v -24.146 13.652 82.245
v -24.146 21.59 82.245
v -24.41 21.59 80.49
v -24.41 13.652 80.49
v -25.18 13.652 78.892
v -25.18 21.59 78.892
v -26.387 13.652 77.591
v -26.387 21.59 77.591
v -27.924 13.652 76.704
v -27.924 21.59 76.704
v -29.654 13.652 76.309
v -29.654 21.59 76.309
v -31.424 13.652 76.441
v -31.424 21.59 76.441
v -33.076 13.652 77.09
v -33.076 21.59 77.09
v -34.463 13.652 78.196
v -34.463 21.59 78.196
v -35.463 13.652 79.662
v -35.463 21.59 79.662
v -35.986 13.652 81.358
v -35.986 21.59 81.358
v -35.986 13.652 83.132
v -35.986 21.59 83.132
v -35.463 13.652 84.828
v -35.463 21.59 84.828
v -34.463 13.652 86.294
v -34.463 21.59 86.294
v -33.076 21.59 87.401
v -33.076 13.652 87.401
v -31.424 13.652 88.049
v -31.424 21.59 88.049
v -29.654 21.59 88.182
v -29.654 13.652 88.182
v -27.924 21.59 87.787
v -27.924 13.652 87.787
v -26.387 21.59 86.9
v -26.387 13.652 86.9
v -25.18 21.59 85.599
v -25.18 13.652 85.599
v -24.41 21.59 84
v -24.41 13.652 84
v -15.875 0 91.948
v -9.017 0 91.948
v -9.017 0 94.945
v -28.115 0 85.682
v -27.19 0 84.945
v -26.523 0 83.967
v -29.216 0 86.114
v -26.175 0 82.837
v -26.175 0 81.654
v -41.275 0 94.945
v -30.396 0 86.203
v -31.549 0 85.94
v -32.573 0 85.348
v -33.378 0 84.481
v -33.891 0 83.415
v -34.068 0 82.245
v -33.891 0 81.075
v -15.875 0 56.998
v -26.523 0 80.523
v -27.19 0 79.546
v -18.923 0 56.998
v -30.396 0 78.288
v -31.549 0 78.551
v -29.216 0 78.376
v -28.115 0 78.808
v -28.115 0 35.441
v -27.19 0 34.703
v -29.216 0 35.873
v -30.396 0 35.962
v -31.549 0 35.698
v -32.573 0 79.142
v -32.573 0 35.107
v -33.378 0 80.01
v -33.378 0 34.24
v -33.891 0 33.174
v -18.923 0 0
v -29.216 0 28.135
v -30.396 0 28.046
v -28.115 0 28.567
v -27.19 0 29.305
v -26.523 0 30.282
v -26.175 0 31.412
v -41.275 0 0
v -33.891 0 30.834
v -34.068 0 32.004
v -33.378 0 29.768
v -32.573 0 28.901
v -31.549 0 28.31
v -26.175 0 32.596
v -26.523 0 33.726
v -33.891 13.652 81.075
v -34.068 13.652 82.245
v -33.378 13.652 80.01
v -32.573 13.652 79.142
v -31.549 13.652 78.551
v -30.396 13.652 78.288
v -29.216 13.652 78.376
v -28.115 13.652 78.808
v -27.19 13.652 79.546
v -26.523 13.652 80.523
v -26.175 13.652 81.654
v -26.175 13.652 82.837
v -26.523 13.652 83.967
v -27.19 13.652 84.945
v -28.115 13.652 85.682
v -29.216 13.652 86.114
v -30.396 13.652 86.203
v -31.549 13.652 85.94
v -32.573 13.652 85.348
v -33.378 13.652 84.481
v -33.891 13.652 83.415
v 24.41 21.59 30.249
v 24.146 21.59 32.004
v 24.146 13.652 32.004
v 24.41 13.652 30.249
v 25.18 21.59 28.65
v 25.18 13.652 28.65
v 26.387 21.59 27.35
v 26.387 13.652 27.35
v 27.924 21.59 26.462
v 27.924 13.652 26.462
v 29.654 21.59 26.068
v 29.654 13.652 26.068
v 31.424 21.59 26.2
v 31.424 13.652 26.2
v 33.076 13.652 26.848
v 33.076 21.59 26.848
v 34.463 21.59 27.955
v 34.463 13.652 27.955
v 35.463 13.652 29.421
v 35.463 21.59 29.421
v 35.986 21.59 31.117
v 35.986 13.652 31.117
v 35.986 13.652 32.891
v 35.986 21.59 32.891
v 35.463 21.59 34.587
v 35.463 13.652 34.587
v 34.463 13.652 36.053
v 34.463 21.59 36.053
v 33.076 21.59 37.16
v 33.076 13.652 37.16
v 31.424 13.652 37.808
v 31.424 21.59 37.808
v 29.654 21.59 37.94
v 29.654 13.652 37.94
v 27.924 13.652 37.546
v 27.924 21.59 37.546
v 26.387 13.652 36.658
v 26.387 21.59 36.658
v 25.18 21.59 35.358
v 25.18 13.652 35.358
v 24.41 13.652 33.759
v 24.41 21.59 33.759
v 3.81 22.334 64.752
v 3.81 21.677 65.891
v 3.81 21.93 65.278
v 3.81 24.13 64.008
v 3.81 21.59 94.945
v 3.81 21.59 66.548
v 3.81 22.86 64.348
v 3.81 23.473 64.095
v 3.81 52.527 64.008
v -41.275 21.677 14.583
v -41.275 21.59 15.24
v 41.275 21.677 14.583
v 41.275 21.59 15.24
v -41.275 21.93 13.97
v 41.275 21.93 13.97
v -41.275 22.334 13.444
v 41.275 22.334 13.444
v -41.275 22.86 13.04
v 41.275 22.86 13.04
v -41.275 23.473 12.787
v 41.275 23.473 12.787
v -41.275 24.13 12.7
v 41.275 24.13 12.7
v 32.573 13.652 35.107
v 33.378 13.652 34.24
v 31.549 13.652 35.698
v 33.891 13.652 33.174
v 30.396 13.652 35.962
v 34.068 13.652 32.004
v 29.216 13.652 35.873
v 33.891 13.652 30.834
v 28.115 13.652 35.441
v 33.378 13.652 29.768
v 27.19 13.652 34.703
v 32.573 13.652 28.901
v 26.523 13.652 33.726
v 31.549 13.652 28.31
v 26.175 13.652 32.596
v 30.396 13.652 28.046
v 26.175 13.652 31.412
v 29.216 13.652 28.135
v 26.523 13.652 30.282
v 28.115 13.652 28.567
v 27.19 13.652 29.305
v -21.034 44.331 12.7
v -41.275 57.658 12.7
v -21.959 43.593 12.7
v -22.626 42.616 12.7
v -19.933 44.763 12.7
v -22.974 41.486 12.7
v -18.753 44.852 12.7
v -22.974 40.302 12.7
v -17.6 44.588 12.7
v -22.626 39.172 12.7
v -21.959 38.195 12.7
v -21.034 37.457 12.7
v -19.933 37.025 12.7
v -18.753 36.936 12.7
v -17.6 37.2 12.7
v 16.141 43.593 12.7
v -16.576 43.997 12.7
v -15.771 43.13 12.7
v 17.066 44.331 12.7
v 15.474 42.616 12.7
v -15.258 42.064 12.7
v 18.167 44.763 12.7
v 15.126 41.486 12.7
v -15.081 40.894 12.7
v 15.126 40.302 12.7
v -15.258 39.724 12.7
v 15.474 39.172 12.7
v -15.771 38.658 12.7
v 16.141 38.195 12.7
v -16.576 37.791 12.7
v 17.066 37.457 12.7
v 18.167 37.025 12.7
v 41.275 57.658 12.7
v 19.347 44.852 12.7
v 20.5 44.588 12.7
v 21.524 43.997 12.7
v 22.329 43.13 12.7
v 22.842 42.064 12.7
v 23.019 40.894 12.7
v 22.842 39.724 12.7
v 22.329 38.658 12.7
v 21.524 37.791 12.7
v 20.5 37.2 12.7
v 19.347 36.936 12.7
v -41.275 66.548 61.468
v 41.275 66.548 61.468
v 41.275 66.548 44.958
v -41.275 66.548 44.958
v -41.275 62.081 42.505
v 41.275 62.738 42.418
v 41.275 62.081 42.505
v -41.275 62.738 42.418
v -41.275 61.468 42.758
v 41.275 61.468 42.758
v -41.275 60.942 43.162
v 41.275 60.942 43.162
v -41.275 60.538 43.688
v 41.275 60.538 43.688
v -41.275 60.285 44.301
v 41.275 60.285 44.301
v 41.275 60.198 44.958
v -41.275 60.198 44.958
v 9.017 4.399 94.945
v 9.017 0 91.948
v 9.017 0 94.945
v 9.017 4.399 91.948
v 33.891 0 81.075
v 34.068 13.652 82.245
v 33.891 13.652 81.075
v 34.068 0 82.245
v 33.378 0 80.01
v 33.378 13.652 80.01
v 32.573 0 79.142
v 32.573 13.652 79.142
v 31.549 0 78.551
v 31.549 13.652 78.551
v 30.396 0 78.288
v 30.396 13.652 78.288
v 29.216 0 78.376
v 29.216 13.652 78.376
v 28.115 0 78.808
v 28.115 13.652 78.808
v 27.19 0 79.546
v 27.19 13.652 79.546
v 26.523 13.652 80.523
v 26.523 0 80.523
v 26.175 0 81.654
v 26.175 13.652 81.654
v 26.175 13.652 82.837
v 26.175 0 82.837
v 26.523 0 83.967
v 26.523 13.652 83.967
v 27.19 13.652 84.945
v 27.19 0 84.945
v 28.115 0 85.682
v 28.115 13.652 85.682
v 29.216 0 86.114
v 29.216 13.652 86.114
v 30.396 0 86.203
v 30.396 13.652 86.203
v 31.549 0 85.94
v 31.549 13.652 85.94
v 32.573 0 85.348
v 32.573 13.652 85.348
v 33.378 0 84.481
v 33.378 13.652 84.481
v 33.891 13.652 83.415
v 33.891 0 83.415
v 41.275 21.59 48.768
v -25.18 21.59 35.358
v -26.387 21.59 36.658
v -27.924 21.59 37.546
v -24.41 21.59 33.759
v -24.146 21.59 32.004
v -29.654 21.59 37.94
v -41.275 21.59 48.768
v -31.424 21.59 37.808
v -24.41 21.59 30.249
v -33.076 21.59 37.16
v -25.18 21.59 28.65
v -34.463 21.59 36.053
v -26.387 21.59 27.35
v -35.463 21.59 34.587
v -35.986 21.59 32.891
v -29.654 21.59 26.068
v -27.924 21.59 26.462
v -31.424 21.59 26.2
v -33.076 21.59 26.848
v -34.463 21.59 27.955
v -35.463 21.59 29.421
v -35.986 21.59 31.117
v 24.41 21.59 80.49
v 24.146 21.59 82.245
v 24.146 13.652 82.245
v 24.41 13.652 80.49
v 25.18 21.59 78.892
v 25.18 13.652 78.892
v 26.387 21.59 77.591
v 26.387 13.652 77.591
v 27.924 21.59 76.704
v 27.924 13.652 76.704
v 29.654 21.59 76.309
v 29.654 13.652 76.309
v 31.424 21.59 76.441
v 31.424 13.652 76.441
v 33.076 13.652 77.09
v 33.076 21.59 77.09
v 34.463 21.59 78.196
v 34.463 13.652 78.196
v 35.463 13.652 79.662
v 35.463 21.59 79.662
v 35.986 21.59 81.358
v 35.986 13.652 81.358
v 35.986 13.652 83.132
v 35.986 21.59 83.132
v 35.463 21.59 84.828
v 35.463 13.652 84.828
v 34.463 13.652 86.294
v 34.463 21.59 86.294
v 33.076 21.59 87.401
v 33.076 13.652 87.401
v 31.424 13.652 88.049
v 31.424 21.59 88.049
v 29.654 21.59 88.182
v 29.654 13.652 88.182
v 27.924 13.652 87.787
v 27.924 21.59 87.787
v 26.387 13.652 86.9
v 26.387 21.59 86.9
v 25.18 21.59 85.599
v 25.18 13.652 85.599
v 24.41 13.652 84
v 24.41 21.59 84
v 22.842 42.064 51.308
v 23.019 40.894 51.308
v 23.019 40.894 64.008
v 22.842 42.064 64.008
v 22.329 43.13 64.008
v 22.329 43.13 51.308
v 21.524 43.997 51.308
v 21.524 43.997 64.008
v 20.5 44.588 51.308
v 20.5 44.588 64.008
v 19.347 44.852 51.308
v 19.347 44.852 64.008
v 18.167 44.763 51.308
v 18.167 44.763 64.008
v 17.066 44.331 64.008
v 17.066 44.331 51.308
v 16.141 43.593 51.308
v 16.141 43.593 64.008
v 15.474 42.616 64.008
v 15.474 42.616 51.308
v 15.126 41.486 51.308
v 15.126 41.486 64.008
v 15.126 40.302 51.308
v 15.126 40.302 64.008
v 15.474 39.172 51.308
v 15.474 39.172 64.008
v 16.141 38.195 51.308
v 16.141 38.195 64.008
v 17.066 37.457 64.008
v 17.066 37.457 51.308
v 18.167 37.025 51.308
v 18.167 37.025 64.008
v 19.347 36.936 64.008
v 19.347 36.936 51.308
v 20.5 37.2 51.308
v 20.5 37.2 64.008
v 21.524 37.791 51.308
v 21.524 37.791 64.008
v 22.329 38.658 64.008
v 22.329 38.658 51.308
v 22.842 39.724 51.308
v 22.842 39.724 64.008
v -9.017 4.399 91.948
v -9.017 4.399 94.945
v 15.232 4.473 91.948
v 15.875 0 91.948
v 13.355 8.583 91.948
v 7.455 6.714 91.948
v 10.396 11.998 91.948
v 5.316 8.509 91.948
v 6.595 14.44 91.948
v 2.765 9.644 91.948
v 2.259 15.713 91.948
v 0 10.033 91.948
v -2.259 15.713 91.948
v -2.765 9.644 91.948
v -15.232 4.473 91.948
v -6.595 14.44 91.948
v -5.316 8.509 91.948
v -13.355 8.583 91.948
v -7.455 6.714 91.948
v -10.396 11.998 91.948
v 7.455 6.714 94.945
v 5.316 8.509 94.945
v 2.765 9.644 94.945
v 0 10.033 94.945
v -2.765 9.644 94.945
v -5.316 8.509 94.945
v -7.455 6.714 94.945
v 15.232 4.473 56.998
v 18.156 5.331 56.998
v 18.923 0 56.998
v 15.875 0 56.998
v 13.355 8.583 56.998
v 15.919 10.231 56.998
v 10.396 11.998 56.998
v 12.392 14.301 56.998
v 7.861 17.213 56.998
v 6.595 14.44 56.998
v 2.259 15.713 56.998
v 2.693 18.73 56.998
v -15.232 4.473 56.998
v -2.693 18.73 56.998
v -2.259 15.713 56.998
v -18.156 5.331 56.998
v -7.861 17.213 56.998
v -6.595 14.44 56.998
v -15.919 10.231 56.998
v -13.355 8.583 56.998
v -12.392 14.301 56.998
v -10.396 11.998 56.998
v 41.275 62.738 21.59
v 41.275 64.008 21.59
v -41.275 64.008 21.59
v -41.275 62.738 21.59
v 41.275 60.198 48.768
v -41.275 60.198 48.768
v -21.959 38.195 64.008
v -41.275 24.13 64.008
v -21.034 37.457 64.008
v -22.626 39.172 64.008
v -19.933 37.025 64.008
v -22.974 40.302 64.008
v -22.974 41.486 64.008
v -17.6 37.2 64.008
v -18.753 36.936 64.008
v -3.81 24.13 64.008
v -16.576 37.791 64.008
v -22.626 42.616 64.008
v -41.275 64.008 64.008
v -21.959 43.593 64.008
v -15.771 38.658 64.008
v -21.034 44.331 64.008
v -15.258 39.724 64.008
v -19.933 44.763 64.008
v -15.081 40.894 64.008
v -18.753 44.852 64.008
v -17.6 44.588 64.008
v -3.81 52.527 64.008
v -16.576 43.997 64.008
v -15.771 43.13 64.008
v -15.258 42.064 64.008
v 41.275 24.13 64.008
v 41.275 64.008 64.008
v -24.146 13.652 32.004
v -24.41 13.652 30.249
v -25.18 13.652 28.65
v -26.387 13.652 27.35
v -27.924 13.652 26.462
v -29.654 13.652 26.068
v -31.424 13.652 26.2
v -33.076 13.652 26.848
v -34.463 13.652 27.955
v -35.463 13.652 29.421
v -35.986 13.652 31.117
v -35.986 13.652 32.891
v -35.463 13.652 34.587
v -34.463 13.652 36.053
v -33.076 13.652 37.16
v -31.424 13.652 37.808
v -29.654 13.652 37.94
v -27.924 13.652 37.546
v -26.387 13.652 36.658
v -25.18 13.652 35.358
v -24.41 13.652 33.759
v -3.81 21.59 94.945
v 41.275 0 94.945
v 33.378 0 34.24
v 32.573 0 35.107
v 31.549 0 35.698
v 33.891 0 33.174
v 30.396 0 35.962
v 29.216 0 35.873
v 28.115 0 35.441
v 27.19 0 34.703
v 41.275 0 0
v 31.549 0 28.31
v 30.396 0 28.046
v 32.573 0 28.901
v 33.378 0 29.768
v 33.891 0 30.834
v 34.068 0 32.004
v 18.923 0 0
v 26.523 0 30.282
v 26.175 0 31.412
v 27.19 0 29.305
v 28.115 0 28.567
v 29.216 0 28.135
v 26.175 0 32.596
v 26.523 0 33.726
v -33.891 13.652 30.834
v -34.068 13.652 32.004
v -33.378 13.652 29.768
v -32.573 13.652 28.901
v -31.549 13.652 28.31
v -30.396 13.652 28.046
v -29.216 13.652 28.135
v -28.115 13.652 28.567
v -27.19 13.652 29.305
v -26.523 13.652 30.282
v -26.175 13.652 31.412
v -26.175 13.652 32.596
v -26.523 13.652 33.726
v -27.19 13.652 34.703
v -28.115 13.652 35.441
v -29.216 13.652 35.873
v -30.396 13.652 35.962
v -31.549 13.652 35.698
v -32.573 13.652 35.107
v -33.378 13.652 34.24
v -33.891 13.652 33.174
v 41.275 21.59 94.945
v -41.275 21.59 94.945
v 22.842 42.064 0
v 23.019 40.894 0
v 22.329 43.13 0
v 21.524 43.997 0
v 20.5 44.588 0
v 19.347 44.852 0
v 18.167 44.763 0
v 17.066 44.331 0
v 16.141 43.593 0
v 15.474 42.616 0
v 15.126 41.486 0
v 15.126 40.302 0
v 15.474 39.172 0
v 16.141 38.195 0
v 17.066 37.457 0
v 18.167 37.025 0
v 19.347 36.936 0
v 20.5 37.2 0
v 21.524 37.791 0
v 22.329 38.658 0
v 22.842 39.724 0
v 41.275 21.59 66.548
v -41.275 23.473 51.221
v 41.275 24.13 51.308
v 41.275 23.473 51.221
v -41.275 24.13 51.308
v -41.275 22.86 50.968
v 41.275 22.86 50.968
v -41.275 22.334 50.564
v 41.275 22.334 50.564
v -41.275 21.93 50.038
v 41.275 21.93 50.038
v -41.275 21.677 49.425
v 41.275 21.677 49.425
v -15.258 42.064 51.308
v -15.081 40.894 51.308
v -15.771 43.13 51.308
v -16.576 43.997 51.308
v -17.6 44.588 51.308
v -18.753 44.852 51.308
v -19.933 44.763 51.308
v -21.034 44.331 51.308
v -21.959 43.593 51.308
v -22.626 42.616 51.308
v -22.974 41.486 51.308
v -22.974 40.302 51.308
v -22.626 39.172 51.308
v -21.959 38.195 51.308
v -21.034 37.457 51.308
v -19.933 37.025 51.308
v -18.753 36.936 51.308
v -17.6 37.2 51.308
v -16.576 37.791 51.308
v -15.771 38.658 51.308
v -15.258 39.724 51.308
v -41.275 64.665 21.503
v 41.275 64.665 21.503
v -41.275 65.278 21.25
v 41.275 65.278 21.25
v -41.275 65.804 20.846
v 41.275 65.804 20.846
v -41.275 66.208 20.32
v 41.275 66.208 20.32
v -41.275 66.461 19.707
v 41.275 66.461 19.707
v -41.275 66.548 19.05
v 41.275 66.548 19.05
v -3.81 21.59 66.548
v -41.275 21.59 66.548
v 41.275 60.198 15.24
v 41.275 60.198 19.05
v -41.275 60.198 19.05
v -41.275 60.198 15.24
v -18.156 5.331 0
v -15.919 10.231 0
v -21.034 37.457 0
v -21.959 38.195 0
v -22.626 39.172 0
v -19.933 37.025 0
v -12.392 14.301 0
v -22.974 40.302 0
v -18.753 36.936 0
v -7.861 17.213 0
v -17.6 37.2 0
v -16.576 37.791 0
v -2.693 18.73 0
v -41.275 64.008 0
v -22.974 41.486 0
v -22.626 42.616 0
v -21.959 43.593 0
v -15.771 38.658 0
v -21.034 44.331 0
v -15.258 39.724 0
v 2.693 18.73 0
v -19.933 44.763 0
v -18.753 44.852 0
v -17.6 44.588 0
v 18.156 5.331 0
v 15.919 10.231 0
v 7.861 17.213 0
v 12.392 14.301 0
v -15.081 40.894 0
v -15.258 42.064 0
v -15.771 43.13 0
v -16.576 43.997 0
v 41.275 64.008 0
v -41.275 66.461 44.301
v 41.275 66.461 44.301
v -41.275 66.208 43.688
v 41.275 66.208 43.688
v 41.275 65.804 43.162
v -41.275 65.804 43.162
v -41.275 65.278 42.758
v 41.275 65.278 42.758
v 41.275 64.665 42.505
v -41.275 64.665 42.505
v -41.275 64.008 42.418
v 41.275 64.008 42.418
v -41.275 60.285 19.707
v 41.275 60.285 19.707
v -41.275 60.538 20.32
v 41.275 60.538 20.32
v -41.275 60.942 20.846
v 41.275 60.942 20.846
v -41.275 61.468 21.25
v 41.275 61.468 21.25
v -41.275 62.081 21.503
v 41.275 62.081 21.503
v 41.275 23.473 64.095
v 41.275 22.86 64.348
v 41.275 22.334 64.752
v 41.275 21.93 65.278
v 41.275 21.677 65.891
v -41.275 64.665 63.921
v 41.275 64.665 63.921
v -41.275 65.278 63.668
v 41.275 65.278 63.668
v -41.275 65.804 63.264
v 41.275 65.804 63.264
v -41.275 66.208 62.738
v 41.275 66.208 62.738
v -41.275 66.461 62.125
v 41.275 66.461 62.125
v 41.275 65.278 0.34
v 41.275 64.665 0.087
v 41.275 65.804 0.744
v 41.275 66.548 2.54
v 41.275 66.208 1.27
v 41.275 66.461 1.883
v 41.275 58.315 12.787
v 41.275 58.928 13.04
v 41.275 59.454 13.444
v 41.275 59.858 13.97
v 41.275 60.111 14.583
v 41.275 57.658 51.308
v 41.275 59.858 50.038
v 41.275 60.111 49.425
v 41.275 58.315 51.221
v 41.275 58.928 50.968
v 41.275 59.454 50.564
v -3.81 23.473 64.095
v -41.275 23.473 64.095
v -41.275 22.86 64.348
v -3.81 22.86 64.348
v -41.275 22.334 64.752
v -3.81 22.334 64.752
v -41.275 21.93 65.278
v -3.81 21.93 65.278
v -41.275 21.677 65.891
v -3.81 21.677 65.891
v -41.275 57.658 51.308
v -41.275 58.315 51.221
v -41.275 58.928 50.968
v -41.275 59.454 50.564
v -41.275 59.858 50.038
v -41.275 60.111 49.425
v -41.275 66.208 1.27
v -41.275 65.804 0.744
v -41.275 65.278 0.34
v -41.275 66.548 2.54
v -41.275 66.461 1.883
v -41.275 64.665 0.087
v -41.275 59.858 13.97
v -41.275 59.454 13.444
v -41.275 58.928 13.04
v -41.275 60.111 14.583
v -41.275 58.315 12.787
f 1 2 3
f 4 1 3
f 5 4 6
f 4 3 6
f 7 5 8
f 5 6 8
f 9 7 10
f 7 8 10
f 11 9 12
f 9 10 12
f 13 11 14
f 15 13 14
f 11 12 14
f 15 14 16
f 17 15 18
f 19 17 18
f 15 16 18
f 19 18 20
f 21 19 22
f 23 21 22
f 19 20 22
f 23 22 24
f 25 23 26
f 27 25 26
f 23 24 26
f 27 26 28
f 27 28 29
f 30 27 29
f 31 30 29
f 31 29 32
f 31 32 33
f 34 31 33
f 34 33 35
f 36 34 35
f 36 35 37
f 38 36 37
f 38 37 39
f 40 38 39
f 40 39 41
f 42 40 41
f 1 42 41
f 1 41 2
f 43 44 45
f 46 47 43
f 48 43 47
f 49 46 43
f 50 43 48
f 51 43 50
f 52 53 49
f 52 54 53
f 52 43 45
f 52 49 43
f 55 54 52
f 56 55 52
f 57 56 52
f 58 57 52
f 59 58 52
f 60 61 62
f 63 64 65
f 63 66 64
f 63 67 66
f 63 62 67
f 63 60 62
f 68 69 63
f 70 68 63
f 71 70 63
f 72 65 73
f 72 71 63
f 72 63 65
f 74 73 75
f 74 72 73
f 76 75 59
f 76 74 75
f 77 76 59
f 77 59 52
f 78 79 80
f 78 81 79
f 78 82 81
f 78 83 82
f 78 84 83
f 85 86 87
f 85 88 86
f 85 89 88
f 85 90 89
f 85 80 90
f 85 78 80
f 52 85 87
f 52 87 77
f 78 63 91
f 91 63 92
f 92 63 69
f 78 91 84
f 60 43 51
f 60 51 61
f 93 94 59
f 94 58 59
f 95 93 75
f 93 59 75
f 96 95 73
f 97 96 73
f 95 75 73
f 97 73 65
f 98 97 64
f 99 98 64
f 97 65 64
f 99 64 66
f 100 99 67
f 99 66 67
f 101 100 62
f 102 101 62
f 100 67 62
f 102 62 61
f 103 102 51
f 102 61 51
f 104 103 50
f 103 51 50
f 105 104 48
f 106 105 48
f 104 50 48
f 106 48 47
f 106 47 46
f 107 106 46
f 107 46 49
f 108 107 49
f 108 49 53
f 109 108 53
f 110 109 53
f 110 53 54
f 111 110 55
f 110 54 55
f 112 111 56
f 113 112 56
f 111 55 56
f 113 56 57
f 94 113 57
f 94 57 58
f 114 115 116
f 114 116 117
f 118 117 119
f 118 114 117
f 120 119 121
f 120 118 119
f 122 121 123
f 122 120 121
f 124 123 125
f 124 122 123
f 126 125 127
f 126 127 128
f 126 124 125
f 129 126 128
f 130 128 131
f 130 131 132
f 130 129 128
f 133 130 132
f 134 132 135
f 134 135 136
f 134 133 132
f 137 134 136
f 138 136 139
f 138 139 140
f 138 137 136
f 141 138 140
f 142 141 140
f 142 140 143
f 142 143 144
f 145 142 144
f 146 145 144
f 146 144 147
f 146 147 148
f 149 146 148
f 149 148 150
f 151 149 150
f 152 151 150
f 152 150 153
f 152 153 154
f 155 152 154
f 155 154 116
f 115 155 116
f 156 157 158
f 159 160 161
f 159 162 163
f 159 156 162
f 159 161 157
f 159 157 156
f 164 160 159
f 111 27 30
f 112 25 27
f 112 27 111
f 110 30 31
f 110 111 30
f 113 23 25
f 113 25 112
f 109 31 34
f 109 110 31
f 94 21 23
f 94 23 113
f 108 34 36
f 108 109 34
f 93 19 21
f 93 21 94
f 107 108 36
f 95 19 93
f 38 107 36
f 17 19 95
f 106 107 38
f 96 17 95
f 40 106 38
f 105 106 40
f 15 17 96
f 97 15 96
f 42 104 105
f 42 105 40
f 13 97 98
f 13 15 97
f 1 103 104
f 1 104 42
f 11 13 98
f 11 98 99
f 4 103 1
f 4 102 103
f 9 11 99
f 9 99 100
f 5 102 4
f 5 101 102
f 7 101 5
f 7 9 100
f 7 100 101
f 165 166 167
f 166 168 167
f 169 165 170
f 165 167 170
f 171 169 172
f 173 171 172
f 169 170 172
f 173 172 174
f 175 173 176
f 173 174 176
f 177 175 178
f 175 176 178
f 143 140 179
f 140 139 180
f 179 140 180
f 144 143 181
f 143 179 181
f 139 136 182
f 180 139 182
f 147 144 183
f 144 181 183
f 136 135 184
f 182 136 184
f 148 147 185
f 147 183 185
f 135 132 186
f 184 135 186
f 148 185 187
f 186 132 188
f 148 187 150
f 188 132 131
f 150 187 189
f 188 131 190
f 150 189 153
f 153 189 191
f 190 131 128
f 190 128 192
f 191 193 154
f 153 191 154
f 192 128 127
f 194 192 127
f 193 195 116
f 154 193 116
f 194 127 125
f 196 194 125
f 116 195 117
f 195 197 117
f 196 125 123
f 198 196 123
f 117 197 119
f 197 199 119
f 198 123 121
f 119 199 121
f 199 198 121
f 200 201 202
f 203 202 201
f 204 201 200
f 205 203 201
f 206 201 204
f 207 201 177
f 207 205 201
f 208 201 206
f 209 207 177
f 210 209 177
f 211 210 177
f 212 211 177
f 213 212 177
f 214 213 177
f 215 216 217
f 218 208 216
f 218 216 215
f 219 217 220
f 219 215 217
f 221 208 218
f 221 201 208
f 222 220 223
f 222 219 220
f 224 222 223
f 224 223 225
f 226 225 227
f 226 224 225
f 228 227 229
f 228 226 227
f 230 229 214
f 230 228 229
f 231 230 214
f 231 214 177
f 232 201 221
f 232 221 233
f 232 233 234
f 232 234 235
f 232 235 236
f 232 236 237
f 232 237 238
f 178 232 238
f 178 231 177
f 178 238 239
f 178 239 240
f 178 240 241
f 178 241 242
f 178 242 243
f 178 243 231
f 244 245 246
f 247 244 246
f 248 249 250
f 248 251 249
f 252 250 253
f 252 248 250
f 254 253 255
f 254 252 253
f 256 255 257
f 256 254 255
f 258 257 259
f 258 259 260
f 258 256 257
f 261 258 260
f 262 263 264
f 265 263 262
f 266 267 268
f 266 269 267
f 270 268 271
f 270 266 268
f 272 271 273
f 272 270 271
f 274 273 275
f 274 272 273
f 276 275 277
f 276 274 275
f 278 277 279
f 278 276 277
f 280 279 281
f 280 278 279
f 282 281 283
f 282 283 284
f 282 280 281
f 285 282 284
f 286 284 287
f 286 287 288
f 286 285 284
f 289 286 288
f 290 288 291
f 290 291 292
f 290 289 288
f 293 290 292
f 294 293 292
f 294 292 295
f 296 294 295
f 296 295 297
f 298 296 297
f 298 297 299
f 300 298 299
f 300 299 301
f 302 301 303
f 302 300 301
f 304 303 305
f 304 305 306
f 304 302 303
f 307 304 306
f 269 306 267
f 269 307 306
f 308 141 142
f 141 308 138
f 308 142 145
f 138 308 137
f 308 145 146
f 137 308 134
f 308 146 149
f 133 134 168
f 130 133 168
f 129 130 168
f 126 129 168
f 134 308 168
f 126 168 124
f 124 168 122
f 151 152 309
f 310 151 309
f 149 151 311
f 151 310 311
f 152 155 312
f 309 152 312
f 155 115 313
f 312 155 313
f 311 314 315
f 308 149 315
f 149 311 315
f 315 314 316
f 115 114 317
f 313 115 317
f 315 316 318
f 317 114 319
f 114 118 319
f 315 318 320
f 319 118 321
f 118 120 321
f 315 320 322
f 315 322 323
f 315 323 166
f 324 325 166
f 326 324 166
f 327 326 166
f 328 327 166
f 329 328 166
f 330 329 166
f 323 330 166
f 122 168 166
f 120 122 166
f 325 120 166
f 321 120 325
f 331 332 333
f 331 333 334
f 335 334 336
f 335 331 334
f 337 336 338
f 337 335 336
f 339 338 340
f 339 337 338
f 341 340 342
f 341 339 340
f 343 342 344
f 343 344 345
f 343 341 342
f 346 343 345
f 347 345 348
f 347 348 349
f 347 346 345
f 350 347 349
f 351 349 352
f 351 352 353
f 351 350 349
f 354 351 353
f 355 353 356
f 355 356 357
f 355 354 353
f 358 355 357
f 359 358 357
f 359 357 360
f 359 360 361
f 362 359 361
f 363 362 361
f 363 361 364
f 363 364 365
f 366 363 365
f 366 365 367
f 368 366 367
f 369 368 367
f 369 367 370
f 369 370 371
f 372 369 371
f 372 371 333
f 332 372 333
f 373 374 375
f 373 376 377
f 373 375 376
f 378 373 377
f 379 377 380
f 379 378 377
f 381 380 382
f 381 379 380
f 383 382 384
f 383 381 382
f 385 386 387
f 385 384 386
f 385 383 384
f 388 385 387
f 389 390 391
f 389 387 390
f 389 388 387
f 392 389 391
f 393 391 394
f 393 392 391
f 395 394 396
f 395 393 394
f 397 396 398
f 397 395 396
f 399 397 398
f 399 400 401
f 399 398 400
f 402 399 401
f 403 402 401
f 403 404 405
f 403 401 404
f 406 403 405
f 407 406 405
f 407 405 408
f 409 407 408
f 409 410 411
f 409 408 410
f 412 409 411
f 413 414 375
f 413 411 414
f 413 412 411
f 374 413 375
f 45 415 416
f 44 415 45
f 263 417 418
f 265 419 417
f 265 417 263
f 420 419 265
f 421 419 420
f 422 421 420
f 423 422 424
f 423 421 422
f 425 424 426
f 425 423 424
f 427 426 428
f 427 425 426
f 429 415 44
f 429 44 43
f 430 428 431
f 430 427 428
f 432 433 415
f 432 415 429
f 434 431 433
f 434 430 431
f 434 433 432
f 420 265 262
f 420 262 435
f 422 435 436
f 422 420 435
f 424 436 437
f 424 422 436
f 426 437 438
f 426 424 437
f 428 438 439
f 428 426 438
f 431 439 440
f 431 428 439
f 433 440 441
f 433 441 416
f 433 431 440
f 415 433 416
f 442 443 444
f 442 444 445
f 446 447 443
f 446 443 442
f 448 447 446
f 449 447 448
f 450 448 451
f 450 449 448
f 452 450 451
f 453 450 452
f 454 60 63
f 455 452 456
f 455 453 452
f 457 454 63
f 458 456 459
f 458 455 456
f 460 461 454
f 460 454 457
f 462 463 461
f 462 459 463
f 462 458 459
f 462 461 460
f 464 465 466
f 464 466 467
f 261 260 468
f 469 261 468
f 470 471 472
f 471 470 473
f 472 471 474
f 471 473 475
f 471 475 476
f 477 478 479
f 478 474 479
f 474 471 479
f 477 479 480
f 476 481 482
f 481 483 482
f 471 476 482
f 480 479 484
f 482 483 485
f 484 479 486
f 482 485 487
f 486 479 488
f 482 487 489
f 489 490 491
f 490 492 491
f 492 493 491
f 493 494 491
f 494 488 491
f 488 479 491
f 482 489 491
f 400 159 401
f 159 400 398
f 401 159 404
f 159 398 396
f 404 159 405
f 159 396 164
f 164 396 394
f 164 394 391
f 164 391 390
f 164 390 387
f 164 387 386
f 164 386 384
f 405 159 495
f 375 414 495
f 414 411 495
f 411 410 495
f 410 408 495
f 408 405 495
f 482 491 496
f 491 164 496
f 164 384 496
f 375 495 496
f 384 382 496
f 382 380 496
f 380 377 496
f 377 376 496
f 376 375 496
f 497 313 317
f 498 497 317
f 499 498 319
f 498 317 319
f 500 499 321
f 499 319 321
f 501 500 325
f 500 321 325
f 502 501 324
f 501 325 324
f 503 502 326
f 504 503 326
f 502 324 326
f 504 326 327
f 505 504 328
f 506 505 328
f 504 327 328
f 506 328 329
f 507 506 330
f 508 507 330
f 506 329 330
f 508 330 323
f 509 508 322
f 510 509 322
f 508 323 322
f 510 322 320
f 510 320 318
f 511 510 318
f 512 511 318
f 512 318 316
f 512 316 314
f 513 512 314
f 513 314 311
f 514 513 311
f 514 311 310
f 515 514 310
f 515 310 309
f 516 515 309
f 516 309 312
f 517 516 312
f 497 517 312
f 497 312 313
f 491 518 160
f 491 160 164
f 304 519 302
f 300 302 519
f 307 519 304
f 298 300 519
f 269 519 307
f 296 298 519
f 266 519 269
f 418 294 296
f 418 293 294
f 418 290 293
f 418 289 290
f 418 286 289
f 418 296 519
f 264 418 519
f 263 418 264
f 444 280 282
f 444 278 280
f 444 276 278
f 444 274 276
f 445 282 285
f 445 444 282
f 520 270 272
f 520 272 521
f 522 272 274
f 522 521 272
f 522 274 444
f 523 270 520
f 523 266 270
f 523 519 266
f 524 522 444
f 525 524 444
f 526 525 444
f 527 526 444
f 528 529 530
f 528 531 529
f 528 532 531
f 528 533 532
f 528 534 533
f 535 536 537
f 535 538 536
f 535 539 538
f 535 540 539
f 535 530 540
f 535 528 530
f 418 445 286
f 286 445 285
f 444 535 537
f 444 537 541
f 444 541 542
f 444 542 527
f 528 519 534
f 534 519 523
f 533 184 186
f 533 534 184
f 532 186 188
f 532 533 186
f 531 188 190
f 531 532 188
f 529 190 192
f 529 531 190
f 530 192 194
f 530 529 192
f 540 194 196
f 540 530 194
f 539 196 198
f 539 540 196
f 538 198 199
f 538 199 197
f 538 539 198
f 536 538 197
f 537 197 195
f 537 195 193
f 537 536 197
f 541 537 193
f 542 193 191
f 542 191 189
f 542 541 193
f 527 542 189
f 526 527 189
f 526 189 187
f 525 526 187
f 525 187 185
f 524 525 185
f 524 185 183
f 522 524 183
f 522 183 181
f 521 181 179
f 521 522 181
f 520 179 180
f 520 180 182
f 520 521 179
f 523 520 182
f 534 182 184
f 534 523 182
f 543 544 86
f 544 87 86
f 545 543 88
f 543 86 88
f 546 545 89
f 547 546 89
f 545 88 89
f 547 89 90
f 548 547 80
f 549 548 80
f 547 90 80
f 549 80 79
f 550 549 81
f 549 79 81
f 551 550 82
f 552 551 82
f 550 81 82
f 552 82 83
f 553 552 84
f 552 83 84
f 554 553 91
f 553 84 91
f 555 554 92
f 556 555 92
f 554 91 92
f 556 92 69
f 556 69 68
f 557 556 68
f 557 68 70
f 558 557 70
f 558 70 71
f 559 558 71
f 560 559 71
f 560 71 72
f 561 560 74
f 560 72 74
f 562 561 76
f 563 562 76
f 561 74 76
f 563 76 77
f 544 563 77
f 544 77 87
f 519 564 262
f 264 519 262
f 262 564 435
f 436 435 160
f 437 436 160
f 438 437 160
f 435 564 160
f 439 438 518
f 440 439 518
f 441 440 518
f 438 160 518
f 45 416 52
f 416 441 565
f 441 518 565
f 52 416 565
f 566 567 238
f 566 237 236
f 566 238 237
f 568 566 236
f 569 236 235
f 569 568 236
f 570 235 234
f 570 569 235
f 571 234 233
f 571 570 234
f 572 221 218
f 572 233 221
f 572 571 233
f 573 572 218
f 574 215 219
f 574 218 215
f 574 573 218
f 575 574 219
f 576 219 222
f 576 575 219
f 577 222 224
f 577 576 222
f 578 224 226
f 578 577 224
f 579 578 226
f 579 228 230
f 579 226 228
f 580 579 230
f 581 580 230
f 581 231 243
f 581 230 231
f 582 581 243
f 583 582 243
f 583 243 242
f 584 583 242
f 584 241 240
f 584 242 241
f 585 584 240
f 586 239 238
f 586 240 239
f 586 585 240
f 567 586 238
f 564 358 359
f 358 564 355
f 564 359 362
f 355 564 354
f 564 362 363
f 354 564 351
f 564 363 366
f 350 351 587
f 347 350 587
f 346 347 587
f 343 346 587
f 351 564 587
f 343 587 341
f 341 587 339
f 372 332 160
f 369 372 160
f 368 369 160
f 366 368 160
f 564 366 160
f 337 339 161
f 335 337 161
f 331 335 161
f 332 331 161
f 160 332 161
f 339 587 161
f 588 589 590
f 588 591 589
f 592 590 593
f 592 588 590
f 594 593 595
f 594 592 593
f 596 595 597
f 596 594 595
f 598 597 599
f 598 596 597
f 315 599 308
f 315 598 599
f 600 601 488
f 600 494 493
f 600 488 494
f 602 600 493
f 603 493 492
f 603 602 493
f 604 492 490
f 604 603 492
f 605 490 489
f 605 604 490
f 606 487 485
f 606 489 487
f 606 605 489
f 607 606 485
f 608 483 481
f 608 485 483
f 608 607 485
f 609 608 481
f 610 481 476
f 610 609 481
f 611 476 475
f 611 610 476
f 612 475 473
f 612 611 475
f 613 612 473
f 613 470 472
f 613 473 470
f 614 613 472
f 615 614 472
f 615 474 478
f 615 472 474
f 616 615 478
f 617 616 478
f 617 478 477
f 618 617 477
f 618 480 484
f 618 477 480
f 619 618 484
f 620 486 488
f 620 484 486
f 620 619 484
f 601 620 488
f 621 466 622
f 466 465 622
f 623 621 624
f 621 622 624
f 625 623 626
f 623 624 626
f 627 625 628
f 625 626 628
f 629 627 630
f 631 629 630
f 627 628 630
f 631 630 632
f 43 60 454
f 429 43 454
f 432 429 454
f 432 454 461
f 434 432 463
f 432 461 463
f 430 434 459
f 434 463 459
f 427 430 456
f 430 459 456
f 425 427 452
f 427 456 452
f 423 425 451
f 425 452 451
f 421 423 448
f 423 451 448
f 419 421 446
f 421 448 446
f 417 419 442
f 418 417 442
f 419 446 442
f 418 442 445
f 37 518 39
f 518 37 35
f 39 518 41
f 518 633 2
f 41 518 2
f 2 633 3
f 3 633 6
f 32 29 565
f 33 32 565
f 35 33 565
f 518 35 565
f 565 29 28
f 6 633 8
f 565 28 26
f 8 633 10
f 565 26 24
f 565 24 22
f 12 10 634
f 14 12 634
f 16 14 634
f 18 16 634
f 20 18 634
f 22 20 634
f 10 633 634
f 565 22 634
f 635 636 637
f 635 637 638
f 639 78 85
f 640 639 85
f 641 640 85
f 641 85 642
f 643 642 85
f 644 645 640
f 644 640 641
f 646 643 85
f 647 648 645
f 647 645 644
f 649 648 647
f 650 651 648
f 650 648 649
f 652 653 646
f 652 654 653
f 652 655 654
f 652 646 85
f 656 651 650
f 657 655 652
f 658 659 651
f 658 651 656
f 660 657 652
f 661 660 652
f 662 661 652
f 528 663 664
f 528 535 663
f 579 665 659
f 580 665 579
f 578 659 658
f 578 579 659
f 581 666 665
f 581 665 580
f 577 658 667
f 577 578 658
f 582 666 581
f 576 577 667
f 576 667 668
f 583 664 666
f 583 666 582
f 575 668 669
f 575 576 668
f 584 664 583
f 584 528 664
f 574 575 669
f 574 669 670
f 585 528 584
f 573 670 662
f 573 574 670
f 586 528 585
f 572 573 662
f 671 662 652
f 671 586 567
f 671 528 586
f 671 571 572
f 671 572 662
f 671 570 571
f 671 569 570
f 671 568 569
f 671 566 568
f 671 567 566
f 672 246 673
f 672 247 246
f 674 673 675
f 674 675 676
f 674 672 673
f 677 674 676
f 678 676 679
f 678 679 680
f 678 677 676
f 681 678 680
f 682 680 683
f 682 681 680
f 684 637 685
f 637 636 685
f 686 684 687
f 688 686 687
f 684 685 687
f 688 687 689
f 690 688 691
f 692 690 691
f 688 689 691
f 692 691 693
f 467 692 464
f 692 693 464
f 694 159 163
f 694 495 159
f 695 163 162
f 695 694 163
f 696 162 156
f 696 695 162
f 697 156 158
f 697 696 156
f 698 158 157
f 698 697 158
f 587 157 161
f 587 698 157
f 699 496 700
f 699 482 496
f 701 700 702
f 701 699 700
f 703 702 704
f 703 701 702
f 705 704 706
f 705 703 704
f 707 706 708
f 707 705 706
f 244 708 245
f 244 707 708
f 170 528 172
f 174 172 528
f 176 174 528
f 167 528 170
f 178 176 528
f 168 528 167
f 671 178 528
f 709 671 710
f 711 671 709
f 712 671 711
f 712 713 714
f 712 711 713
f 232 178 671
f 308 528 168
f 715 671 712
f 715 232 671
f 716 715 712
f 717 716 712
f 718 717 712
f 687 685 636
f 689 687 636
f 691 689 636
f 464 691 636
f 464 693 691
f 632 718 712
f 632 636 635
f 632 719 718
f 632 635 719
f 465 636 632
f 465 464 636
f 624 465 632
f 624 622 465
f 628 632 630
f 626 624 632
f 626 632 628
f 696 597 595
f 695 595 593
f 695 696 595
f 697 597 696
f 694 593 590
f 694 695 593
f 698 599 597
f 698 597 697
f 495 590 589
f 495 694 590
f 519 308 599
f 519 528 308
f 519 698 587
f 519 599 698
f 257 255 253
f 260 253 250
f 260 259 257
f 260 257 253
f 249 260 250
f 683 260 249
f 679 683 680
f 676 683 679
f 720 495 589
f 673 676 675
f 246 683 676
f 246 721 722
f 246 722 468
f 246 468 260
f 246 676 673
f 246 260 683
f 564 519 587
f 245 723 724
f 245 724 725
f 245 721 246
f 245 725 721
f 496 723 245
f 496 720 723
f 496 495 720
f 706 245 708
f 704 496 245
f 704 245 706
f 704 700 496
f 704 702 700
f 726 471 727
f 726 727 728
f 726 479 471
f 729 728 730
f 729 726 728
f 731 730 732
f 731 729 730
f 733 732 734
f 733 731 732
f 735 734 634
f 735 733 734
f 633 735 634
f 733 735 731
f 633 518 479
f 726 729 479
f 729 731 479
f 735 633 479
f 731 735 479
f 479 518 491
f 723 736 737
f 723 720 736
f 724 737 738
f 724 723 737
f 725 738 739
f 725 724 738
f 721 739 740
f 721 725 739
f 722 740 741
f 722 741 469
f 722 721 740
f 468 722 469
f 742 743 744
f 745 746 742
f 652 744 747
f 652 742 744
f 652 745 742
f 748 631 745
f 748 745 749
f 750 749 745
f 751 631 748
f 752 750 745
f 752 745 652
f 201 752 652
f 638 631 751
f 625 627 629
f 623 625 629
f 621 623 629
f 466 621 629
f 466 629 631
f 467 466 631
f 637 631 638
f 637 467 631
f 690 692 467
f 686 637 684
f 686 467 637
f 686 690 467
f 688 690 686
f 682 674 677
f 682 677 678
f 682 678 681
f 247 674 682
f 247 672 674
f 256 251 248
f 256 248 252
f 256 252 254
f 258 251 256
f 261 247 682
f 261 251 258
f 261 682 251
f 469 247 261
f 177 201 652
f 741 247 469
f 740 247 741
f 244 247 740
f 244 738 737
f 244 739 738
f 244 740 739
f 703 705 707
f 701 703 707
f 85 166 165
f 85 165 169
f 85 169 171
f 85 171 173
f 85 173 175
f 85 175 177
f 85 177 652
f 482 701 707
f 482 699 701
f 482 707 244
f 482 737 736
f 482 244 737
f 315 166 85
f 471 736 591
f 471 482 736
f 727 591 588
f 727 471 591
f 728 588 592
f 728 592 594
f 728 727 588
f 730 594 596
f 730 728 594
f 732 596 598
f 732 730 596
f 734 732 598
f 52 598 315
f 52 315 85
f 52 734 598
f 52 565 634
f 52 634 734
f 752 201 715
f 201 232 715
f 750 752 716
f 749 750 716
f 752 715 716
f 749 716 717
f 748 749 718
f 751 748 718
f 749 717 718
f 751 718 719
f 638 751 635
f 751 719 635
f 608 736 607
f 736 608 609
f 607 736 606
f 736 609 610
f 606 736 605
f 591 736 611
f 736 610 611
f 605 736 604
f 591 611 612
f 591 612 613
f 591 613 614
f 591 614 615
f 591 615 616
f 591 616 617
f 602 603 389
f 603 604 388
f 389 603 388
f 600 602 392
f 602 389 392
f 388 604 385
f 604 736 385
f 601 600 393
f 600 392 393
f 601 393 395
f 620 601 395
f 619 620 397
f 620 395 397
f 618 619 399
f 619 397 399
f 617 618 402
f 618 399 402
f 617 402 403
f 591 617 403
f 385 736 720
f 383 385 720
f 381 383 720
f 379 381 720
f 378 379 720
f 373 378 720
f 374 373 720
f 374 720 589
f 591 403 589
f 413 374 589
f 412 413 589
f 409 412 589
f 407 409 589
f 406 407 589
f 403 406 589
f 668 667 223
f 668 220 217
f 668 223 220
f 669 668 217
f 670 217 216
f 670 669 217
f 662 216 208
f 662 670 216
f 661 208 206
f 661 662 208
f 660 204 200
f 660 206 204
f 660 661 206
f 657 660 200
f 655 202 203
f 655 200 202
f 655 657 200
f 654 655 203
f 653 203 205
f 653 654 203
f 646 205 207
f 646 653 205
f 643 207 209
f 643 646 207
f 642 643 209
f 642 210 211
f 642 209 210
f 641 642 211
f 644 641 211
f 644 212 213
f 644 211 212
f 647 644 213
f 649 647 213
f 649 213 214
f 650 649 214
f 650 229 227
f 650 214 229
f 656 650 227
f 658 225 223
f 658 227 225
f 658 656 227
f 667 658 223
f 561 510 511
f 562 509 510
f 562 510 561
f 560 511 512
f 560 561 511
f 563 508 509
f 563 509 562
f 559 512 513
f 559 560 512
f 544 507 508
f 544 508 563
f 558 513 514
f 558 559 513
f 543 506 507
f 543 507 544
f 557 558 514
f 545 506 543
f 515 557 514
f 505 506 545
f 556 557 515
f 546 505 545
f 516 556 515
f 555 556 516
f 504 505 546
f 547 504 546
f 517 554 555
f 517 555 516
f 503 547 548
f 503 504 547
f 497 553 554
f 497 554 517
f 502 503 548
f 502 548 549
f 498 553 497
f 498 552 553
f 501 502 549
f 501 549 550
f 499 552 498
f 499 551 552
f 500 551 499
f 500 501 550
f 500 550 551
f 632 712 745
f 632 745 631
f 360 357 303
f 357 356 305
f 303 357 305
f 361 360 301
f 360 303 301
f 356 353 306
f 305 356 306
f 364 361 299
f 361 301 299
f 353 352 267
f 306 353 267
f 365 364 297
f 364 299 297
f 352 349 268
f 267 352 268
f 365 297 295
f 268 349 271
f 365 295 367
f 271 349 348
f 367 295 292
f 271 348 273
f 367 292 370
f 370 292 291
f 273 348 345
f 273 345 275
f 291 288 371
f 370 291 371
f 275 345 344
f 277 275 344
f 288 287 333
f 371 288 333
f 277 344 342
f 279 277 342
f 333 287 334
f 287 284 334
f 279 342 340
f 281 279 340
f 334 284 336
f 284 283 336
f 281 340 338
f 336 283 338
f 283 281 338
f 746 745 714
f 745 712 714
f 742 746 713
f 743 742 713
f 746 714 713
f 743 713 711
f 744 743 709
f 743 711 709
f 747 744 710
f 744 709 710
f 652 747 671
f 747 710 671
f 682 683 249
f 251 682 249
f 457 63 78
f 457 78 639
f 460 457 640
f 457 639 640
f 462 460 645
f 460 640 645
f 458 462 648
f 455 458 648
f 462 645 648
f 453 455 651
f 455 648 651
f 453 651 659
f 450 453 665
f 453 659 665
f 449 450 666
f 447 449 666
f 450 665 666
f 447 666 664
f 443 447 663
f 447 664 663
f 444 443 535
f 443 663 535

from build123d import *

# Parameters (mm, degrees)
BOSS_EXTRUDE1_DEPTH             = 94.9452
SKETCH2_R                       = 18.923
CUT_EXTRUDE1_DEPTH              = 56.9976
BOSS_EXTRUDE2_START             = -2.9972
BOSS_EXTRUDE2_DEPTH             = 2.9972
BOSS_EXTRUDE3_REACH             = 107.756
BOSS_EXTRUDE3_DIRECTION_2_REACH = 107.756
HOLE2_D                         = 7.9375
HOLE2_CBORE_D                   = 11.90625
HOLE2_CBORE_DEPTH               = 7.9375
CUT_EXTRUDE3_DEPTH              = 124.072551497
CUT_EXTRUDE3_DEPTH_BACK         = 124.072551497
SKETCH10_R                      = 3.96875
RIB1_REACH                      = 125.073
SKETCH11_WALL_W                 = 291.896910816
SKETCH11_WALL_H                 = 7.62
FILLET1_R                       = 2.54


with BuildPart() as part:
    # Sketch1 → Boss-Extrude1 (new body)
    with BuildSketch(Plane.XY):
        with BuildLine():
            Line((15.875, 0), (41.275, 0))
            Line((41.275, 0), (41.275, 21.59))
            Line((41.275, 21.59), (-41.275, 21.59))
            Line((-41.275, 21.59), (-41.275, 0))
            Line((-41.275, 0), (-15.875, 0))
            ThreePointArc((-15.875, 0), (0, 15.875), (15.875, 0))
        make_face()
    extrude(amount=BOSS_EXTRUDE1_DEPTH)

    # Sketch2 → Cut-Extrude1 (cut)
    with BuildSketch(Plane(origin=(0, 0, 0), x_dir=(-1, 0, 0), z_dir=(0, 0, -1))):
        Circle(SKETCH2_R)
    extrude(amount=-CUT_EXTRUDE1_DEPTH, mode=Mode.SUBTRACT)

    # Sketch3 → Boss-Extrude2 (add)
    with BuildSketch(Plane.XY.offset(94.9452).offset(BOSS_EXTRUDE2_START)):
        with BuildLine():
            Line((-9.017, 4.399409051), (-9.017, 0))
            Line((-9.017, 0), (-15.875, 0))
            ThreePointArc((-15.875, 0), (0, 15.875), (15.875, 0))
            Line((15.875, 0), (9.017, 0))
            Line((9.017, 0), (9.017, 4.399409051))
            ThreePointArc((9.017, 4.399409051), (0, 10.033), (-9.017, 4.399409051))
        make_face()
    extrude(amount=BOSS_EXTRUDE2_DEPTH)

    # Boss-Extrude3: up to this face of the body (flat: up to its plane)
    boss_extrude3_end = Plane(part.part.faces().sort_by_distance((41.275, 10.795, 47.4726))[0])
    # Sketch6 → Boss-Extrude3 (add, up to the picked face)
    with BuildSketch(Plane(origin=(0, 0, 0), x_dir=(0, 0, -1), z_dir=(1, 0, 0)), mode=Mode.PRIVATE) as boss_extrude3_sk1:
        Polygon((0, 21.59), (0, 66.548), (-21.59, 66.548), (-21.59, 60.198), (-12.7, 60.198), (-12.7, 21.59), align=None)
    boss_extrude3_tool1 = split(extrude(boss_extrude3_sk1.sketch, amount=BOSS_EXTRUDE3_REACH, mode=Mode.PRIVATE), bisect_by=boss_extrude3_end, keep=Keep.BOTH, mode=Mode.PRIVATE)
    # Sketch6 → Boss-Extrude3 (add, up to the picked face)
    with BuildSketch(Plane(origin=(0, 0, 0), x_dir=(0, 0, -1), z_dir=(1, 0, 0)), mode=Mode.PRIVATE) as boss_extrude3_sk2:
        Polygon((-51.308, 21.59), (-64.008, 21.59), (-64.008, 66.548), (-42.418, 66.548), (-42.418, 60.198), (-51.308, 60.198), align=None)
    boss_extrude3_tool2 = split(extrude(boss_extrude3_sk2.sketch, amount=BOSS_EXTRUDE3_REACH, mode=Mode.PRIVATE), bisect_by=boss_extrude3_end, keep=Keep.BOTH, mode=Mode.PRIVATE)
    add(boss_extrude3_tool1.solids().sort_by(Axis((0, 45.805864, 7.321272), (1, 0, 0)))[0])
    add(boss_extrude3_tool2.solids().sort_by(Axis((0, 45.805864, 56.686728), (1, 0, 0)))[0])

    # Boss-Extrude3 direction 2: up to this face of the body (flat: up to its plane)
    boss_extrude3_direction_2_end = Plane(part.part.faces().sort_by_distance((-41.275, 10.795, 47.4726))[0])
    # Sketch6 → Boss-Extrude3 direction 2 (add, up to the picked face)
    with BuildSketch(Plane(origin=(0, 0, 0), x_dir=(0, 0, -1), z_dir=(1, 0, 0)), mode=Mode.PRIVATE) as boss_extrude3_direction_2_sk1:
        Polygon((0, 21.59), (0, 66.548), (-21.59, 66.548), (-21.59, 60.198), (-12.7, 60.198), (-12.7, 21.59), align=None)
    boss_extrude3_direction_2_tool1 = split(extrude(boss_extrude3_direction_2_sk1.sketch, amount=-BOSS_EXTRUDE3_DIRECTION_2_REACH, mode=Mode.PRIVATE), bisect_by=boss_extrude3_direction_2_end, keep=Keep.BOTH, mode=Mode.PRIVATE)
    # Sketch6 → Boss-Extrude3 direction 2 (add, up to the picked face)
    with BuildSketch(Plane(origin=(0, 0, 0), x_dir=(0, 0, -1), z_dir=(1, 0, 0)), mode=Mode.PRIVATE) as boss_extrude3_direction_2_sk2:
        Polygon((-51.308, 21.59), (-64.008, 21.59), (-64.008, 66.548), (-42.418, 66.548), (-42.418, 60.198), (-51.308, 60.198), align=None)
    boss_extrude3_direction_2_tool2 = split(extrude(boss_extrude3_direction_2_sk2.sketch, amount=-BOSS_EXTRUDE3_DIRECTION_2_REACH, mode=Mode.PRIVATE), bisect_by=boss_extrude3_direction_2_end, keep=Keep.BOTH, mode=Mode.PRIVATE)
    add(boss_extrude3_direction_2_tool1.solids().sort_by(Axis((0, 45.805864, 7.321272), (-1, 0, 0)))[0])
    add(boss_extrude3_direction_2_tool2.solids().sort_by(Axis((0, 45.805864, 56.686728), (-1, 0, 0)))[0])

    # Hole2 (through all)
    with Locations(Plane(origin=(0, 21.59, 0), x_dir=(1, 0, 0), z_dir=(0, 1, 0))):
        with Locations((-30.099, -32.004), (-30.099, -82.2452)):
            hole2 = CounterBoreHole(HOLE2_D / 2, HOLE2_CBORE_D / 2, HOLE2_CBORE_DEPTH)

    # Mirror2: Hole2 across plane
    add(hole2.mirror(Plane(origin=(0, 0, 0), x_dir=(0, 0, 1), z_dir=(1, 0, 0))), mode=Mode.SUBTRACT)

    # Sketch10 → Cut-Extrude3 (cut, two sides: drawn at the far end of the back side and taken through both)
    with BuildSketch(Plane.XY.offset(-CUT_EXTRUDE3_DEPTH_BACK)):
        with Locations((-19.05, 40.894)):
            Circle(SKETCH10_R)
        with Locations((19.05, 40.894)):
            Circle(SKETCH10_R)
    extrude(amount=CUT_EXTRUDE3_DEPTH + CUT_EXTRUDE3_DEPTH_BACK, mode=Mode.SUBTRACT)

    # Sketch11 wall → Rib1 (add, up to next)
    with BuildSketch(Plane(origin=(0, 37.0586, 79.4766), x_dir=(0, 0.707106781187, -0.707106781187), z_dir=(0, 0.707106781187, 0.707106781187)), mode=Mode.PRIVATE) as rib1_sk1:
        Rectangle(SKETCH11_WALL_W, SKETCH11_WALL_H)
    rib1_tool1 = extrude(rib1_sk1.sketch, amount=-RIB1_REACH, mode=Mode.PRIVATE) - part.part
    add(rib1_tool1.solids().sort_by_distance((0, 37.0586, 79.4766))[0])

    # Fillet1
    fillet1_edges = [part.edges().sort_by_distance(p)[0] for p in [
        (-22.5425, 21.59, 64.008),
        (0, 60.198, 12.7),
        (0, 60.198, 21.59),
        (0, 66.548, 21.59),
        (0, 66.548, 0),
        (0, 21.59, 12.7),
        (22.5425, 21.59, 64.008),
        (0, 66.548, 64.008),
        (0, 66.548, 42.418),
        (0, 60.198, 42.418),
        (0, 60.198, 51.308),
        (0, 21.59, 51.308),
    ]]
    fillet(fillet1_edges, radius=FILLET1_R)


solid = part.part
